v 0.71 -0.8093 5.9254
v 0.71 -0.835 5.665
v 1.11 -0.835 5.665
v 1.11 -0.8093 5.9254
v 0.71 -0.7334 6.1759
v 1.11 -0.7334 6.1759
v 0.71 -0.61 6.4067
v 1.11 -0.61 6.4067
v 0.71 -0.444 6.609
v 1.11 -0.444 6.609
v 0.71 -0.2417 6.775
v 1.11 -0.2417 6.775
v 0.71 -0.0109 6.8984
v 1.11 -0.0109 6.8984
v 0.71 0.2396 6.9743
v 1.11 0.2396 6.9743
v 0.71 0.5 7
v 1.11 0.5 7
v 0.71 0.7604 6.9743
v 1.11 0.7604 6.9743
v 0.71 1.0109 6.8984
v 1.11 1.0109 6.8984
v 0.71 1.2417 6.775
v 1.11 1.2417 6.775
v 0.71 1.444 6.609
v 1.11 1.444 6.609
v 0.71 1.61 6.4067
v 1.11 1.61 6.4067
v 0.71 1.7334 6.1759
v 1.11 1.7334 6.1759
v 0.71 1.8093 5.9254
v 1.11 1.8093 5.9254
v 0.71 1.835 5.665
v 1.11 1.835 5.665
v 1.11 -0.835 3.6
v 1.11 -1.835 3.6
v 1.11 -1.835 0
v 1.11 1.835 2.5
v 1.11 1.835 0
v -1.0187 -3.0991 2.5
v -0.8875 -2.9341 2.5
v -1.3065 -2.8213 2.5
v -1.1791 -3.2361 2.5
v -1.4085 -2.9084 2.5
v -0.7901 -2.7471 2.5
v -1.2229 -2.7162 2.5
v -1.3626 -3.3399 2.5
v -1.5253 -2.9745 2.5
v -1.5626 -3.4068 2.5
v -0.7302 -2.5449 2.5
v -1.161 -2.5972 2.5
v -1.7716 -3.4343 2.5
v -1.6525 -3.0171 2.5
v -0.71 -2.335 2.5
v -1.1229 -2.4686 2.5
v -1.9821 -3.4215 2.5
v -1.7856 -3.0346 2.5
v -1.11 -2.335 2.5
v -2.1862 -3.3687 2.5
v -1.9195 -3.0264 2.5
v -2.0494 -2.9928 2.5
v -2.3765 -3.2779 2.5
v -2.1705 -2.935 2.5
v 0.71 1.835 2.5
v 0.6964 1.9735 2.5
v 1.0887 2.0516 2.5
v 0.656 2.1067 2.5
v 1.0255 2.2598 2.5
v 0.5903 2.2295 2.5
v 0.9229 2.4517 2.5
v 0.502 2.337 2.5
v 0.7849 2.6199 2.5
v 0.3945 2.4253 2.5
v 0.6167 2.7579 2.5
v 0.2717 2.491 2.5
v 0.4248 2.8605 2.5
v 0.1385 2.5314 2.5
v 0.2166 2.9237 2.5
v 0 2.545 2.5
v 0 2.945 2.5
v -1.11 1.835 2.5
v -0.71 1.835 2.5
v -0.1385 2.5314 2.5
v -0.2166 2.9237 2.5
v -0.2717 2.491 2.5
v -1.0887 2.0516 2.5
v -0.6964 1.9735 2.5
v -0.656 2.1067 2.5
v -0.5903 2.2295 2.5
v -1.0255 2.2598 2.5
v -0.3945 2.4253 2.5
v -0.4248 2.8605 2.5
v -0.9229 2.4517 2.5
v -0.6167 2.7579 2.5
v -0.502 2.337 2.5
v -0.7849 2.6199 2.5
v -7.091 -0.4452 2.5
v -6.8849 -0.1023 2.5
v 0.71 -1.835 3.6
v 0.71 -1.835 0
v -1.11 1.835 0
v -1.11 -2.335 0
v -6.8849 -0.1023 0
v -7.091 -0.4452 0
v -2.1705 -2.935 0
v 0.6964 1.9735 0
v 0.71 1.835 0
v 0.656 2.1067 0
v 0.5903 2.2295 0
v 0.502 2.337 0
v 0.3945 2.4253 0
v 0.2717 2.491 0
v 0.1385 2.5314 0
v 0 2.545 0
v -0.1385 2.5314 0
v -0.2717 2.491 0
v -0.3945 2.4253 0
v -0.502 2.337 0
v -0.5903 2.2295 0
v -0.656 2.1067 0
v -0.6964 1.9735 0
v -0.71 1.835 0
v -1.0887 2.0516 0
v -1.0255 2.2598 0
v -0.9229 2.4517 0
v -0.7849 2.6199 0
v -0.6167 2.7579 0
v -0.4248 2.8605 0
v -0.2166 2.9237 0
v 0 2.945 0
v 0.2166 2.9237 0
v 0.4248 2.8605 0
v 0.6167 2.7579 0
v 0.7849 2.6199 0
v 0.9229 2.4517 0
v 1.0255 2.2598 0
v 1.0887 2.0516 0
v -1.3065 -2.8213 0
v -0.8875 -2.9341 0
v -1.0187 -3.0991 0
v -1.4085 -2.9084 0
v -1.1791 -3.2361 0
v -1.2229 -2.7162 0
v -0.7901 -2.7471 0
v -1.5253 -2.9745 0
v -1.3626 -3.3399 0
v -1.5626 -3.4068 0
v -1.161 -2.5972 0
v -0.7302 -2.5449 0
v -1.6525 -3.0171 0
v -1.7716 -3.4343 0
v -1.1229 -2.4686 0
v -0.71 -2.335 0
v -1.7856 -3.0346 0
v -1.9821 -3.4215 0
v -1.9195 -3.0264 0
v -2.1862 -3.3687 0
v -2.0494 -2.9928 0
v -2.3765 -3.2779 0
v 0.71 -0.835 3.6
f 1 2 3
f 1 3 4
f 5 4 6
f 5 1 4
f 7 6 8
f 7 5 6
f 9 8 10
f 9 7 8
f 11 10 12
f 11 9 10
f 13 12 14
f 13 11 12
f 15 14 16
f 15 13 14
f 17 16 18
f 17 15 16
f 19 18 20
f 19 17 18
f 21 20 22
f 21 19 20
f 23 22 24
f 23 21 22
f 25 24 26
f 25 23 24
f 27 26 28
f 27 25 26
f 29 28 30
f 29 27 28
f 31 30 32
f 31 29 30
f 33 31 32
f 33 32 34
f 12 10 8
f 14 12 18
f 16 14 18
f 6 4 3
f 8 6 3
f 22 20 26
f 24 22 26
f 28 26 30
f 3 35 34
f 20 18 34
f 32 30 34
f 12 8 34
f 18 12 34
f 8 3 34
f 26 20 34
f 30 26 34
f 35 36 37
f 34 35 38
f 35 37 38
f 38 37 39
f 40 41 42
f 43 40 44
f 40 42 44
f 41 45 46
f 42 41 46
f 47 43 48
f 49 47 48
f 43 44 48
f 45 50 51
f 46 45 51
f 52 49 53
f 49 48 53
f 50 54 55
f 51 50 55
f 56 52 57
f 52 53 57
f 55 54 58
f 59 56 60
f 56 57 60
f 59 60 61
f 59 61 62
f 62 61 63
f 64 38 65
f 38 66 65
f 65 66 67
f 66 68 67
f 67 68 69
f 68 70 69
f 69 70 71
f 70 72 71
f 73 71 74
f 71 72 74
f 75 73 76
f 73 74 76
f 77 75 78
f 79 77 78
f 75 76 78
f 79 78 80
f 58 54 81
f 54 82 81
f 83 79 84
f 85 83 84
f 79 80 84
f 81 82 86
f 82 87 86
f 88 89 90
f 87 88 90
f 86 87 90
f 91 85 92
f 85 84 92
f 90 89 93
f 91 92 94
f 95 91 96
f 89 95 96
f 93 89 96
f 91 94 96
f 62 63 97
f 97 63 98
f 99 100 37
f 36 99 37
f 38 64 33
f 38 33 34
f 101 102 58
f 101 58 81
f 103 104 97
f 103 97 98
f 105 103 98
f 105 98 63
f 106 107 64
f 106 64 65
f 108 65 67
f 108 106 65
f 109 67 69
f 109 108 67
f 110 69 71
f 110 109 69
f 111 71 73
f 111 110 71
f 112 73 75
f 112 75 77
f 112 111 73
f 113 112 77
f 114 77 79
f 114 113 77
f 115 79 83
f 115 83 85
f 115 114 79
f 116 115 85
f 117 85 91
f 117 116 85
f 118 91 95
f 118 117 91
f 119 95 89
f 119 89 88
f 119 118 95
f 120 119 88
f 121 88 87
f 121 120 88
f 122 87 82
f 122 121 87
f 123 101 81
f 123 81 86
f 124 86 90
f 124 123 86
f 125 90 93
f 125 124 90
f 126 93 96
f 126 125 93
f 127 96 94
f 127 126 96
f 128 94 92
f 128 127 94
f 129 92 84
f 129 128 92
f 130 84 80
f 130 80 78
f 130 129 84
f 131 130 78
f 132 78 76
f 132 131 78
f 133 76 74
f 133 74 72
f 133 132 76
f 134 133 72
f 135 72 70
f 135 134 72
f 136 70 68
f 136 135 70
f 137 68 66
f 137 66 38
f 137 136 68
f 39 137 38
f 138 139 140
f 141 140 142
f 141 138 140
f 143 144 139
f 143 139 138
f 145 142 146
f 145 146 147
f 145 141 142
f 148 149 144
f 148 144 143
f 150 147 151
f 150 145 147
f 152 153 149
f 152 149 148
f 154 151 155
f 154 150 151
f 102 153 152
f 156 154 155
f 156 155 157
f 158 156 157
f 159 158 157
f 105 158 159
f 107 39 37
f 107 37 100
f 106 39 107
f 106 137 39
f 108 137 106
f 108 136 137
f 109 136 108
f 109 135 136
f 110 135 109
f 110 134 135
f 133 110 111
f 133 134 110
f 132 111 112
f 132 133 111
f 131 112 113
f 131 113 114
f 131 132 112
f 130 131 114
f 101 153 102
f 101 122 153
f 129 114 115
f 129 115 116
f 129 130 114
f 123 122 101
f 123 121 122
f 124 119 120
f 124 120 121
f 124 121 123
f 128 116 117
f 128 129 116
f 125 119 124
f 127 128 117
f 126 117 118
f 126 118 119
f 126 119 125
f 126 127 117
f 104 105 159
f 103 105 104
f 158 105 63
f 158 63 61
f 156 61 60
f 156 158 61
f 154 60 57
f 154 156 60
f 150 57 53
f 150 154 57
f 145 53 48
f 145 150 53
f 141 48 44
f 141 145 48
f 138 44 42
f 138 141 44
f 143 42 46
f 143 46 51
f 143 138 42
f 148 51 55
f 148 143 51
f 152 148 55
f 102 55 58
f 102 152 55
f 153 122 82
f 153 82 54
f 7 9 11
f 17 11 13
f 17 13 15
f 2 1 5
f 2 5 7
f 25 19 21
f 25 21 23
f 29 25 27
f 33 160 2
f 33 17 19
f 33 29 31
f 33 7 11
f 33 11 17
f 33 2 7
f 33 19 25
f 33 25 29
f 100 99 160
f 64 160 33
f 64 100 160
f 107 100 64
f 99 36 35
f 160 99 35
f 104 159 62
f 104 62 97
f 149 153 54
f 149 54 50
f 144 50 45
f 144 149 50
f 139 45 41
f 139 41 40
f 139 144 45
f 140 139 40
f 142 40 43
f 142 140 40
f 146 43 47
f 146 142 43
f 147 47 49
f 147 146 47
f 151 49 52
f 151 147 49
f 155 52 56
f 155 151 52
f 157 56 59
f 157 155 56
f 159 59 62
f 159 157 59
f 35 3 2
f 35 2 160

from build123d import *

# Parameters (mm, degrees)
BASE_FLANGE1_DEPTH  = 2.5
SKETCH3_W           = 0.4
SKETCH3_H           = 3.67
BOSS_EXTRUDE1_DEPTH = 4.5
SKETCH5_W           = 3.4
SKETCH5_H           = 1
CUT_EXTRUDE1_DEPTH  = 4.5
FILLET1_RADIUS      = 1.335
FILLET1_LENGTH      = 0.4


# Sheet-metal steps are written as plain solids
with BuildPart() as part:
    # Sketch2 → Base-Flange1 (new body)
    with BuildSketch(Plane.XY):
        with BuildLine():
            Line((0.71, -1.835), (0.71, 1.835))
            ThreePointArc((0.71, 1.835), (0, 2.545), (-0.71, 1.835))
            Line((-0.71, 1.835), (-0.71, -2.335))
            ThreePointArc((-0.71, -2.335), (-1.268334084, -3.292391266), (-2.376541882, -3.277884031))
            Line((-2.376541882, -3.277884031), (-7.090962036, -0.445174619))
            Line((-7.090962036, -0.445174619), (-6.884946806, -0.102307698))
            Line((-6.884946806, -0.102307698), (-2.170526652, -2.93501711))
            ThreePointArc((-2.170526652, -2.93501711), (-1.465303508, -2.944248987), (-1.11, -2.335))
            Line((-1.11, -2.335), (-1.11, 1.835))
            ThreePointArc((-1.11, 1.835), (0, 2.945), (1.11, 1.835))
            Line((1.11, 1.835), (1.11, -1.835))
            Line((1.11, -1.835), (0.71, -1.835))
        make_face()
    extrude(amount=BASE_FLANGE1_DEPTH)

    # Sketch3 → Boss-Extrude1 (add)
    with BuildSketch(Plane.XY.offset(2.5)):
        with Locations((0.91, 0)):
            Rectangle(SKETCH3_W, SKETCH3_H)
    extrude(amount=BOSS_EXTRUDE1_DEPTH)

    # Sketch5 → Cut-Extrude1 (cut)
    with BuildSketch(Plane(origin=(1.11, 0, 0), x_dir=(0, 0, -1), z_dir=(1, 0, 0))):
        with Locations((-5.3, -1.335)):
            Rectangle(SKETCH5_W, SKETCH5_H)
    extrude(amount=-CUT_EXTRUDE1_DEPTH, mode=Mode.SUBTRACT)

    # Fillet1: full round fillet: the end face becomes a half cylinder, R = half its width
    fillet1_face = Plane((0.91, 0.5, 7), x_dir=(-1, 0, 0), z_dir=(0, 0, 1))  # on the end face: x along it, z out of the body
    fillet1_slab = fillet1_face.offset(-FILLET1_RADIUS / 2) * Box(FILLET1_LENGTH, 2 * FILLET1_RADIUS, FILLET1_RADIUS, mode=Mode.PRIVATE)  # the body's end, R deep
    fillet1_round = Plane((0.91, 0.5, 5.665), x_dir=(0, 0, 1), z_dir=(-1, 0, 0)) * Cylinder(FILLET1_RADIUS, FILLET1_LENGTH, mode=Mode.PRIVATE)  # its axis R under the face
    add(fillet1_slab - fillet1_round, mode=Mode.SUBTRACT)


solid = part.part
